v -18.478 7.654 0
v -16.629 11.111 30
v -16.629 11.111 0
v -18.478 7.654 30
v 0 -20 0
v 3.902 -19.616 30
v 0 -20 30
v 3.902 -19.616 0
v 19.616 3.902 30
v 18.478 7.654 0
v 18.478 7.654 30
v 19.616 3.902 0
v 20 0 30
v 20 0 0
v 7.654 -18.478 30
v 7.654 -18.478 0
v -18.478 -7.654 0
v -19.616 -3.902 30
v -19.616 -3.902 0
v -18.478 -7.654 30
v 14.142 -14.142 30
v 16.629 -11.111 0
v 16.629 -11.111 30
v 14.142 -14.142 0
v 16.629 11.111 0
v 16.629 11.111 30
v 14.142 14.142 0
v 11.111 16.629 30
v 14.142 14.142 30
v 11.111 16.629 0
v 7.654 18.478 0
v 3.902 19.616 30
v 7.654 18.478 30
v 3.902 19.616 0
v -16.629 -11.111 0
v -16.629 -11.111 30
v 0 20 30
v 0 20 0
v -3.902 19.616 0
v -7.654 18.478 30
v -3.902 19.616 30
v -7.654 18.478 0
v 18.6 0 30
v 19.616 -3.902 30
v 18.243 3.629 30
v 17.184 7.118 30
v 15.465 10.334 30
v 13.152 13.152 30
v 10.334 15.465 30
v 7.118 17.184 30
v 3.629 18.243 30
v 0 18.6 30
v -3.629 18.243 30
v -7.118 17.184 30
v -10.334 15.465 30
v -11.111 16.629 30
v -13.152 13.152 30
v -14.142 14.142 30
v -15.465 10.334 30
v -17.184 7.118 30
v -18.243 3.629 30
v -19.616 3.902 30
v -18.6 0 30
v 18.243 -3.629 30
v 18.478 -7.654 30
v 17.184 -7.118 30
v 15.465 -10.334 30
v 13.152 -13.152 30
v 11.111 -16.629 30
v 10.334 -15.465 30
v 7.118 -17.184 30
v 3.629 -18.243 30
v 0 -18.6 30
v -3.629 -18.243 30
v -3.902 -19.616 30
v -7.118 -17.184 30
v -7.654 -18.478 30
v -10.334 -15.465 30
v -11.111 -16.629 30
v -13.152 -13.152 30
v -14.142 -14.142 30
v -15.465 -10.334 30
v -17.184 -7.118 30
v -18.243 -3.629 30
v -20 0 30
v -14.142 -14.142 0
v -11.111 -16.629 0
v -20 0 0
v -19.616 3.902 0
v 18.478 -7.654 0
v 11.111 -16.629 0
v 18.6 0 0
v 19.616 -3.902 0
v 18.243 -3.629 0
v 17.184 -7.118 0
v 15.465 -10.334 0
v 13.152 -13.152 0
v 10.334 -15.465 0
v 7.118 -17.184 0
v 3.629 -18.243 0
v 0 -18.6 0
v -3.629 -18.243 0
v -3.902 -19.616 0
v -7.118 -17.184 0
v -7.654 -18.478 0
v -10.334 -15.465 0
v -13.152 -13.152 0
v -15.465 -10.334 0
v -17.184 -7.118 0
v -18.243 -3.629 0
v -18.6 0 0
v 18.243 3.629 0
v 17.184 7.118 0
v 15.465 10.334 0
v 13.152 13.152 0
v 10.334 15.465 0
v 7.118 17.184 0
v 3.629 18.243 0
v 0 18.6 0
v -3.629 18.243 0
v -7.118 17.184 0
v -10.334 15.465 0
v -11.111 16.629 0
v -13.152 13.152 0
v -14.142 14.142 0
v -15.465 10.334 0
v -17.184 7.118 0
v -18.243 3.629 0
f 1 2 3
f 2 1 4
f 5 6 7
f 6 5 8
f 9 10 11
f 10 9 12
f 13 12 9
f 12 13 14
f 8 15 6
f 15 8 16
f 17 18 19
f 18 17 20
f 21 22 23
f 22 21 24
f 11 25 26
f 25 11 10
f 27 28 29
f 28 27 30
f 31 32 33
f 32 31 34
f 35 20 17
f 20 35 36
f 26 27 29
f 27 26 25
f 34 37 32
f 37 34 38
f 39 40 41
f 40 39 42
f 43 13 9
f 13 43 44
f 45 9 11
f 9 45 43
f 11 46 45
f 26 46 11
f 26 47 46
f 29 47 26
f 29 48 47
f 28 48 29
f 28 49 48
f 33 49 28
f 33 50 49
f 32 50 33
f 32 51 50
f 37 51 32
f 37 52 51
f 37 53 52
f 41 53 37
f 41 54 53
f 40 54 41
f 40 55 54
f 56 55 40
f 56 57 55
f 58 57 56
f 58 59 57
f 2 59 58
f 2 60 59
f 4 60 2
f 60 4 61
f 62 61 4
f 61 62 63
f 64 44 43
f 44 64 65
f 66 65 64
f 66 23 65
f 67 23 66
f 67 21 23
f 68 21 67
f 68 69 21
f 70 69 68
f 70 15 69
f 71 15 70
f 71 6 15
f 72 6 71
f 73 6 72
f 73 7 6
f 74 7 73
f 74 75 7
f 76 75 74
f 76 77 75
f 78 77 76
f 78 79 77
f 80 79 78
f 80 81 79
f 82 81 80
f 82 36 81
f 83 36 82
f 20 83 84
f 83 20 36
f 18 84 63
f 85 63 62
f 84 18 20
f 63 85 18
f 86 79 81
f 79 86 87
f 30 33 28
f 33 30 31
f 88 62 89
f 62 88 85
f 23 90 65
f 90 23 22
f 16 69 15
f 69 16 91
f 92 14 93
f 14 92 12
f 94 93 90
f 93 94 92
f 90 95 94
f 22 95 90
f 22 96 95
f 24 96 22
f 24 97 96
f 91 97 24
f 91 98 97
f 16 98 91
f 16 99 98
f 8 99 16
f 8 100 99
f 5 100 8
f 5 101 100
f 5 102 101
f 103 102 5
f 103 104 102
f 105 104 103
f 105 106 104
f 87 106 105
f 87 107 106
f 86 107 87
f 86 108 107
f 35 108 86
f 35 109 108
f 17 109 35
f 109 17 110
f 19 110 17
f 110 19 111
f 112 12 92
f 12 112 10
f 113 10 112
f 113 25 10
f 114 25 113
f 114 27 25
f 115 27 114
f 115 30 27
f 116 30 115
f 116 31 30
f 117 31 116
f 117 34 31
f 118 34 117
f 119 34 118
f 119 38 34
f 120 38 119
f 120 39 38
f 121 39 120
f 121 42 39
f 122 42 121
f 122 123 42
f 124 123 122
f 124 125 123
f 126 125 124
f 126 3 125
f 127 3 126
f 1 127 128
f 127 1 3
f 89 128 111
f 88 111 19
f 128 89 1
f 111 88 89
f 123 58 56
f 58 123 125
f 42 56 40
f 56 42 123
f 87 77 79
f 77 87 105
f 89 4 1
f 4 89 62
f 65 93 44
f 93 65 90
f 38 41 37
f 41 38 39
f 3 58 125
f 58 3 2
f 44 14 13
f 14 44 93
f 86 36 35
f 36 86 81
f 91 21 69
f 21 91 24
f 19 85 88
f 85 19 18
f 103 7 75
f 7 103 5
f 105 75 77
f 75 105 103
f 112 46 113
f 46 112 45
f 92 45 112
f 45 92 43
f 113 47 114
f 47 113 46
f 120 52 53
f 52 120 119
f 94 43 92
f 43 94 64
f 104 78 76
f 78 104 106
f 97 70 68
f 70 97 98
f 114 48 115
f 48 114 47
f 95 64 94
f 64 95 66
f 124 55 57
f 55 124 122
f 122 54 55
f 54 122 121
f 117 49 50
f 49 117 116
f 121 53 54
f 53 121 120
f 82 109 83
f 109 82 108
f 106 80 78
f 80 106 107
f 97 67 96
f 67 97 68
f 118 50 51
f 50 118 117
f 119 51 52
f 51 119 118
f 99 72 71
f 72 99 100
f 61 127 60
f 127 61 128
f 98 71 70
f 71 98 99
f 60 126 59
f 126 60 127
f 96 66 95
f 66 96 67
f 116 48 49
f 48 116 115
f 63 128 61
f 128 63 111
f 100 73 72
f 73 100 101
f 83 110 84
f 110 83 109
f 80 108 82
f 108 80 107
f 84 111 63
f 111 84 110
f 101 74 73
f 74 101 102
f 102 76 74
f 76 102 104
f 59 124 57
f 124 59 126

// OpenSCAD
$fn = 32;

// ----------------------------------------------------------------------
// Thin tube: 1.4 mm wall
// ----------------------------------------------------------------------

// --- parameters (mm) ---
tube_od = 40;             // outer diameter
tube_h = 30;              // height, Z
wall = 1.4;               // wall thickness

difference() {
  cylinder(h = tube_h, d = tube_od);
  translate([0, 0, -1]) cylinder(h = tube_h + 2, d = tube_od - 2 * wall);
}
